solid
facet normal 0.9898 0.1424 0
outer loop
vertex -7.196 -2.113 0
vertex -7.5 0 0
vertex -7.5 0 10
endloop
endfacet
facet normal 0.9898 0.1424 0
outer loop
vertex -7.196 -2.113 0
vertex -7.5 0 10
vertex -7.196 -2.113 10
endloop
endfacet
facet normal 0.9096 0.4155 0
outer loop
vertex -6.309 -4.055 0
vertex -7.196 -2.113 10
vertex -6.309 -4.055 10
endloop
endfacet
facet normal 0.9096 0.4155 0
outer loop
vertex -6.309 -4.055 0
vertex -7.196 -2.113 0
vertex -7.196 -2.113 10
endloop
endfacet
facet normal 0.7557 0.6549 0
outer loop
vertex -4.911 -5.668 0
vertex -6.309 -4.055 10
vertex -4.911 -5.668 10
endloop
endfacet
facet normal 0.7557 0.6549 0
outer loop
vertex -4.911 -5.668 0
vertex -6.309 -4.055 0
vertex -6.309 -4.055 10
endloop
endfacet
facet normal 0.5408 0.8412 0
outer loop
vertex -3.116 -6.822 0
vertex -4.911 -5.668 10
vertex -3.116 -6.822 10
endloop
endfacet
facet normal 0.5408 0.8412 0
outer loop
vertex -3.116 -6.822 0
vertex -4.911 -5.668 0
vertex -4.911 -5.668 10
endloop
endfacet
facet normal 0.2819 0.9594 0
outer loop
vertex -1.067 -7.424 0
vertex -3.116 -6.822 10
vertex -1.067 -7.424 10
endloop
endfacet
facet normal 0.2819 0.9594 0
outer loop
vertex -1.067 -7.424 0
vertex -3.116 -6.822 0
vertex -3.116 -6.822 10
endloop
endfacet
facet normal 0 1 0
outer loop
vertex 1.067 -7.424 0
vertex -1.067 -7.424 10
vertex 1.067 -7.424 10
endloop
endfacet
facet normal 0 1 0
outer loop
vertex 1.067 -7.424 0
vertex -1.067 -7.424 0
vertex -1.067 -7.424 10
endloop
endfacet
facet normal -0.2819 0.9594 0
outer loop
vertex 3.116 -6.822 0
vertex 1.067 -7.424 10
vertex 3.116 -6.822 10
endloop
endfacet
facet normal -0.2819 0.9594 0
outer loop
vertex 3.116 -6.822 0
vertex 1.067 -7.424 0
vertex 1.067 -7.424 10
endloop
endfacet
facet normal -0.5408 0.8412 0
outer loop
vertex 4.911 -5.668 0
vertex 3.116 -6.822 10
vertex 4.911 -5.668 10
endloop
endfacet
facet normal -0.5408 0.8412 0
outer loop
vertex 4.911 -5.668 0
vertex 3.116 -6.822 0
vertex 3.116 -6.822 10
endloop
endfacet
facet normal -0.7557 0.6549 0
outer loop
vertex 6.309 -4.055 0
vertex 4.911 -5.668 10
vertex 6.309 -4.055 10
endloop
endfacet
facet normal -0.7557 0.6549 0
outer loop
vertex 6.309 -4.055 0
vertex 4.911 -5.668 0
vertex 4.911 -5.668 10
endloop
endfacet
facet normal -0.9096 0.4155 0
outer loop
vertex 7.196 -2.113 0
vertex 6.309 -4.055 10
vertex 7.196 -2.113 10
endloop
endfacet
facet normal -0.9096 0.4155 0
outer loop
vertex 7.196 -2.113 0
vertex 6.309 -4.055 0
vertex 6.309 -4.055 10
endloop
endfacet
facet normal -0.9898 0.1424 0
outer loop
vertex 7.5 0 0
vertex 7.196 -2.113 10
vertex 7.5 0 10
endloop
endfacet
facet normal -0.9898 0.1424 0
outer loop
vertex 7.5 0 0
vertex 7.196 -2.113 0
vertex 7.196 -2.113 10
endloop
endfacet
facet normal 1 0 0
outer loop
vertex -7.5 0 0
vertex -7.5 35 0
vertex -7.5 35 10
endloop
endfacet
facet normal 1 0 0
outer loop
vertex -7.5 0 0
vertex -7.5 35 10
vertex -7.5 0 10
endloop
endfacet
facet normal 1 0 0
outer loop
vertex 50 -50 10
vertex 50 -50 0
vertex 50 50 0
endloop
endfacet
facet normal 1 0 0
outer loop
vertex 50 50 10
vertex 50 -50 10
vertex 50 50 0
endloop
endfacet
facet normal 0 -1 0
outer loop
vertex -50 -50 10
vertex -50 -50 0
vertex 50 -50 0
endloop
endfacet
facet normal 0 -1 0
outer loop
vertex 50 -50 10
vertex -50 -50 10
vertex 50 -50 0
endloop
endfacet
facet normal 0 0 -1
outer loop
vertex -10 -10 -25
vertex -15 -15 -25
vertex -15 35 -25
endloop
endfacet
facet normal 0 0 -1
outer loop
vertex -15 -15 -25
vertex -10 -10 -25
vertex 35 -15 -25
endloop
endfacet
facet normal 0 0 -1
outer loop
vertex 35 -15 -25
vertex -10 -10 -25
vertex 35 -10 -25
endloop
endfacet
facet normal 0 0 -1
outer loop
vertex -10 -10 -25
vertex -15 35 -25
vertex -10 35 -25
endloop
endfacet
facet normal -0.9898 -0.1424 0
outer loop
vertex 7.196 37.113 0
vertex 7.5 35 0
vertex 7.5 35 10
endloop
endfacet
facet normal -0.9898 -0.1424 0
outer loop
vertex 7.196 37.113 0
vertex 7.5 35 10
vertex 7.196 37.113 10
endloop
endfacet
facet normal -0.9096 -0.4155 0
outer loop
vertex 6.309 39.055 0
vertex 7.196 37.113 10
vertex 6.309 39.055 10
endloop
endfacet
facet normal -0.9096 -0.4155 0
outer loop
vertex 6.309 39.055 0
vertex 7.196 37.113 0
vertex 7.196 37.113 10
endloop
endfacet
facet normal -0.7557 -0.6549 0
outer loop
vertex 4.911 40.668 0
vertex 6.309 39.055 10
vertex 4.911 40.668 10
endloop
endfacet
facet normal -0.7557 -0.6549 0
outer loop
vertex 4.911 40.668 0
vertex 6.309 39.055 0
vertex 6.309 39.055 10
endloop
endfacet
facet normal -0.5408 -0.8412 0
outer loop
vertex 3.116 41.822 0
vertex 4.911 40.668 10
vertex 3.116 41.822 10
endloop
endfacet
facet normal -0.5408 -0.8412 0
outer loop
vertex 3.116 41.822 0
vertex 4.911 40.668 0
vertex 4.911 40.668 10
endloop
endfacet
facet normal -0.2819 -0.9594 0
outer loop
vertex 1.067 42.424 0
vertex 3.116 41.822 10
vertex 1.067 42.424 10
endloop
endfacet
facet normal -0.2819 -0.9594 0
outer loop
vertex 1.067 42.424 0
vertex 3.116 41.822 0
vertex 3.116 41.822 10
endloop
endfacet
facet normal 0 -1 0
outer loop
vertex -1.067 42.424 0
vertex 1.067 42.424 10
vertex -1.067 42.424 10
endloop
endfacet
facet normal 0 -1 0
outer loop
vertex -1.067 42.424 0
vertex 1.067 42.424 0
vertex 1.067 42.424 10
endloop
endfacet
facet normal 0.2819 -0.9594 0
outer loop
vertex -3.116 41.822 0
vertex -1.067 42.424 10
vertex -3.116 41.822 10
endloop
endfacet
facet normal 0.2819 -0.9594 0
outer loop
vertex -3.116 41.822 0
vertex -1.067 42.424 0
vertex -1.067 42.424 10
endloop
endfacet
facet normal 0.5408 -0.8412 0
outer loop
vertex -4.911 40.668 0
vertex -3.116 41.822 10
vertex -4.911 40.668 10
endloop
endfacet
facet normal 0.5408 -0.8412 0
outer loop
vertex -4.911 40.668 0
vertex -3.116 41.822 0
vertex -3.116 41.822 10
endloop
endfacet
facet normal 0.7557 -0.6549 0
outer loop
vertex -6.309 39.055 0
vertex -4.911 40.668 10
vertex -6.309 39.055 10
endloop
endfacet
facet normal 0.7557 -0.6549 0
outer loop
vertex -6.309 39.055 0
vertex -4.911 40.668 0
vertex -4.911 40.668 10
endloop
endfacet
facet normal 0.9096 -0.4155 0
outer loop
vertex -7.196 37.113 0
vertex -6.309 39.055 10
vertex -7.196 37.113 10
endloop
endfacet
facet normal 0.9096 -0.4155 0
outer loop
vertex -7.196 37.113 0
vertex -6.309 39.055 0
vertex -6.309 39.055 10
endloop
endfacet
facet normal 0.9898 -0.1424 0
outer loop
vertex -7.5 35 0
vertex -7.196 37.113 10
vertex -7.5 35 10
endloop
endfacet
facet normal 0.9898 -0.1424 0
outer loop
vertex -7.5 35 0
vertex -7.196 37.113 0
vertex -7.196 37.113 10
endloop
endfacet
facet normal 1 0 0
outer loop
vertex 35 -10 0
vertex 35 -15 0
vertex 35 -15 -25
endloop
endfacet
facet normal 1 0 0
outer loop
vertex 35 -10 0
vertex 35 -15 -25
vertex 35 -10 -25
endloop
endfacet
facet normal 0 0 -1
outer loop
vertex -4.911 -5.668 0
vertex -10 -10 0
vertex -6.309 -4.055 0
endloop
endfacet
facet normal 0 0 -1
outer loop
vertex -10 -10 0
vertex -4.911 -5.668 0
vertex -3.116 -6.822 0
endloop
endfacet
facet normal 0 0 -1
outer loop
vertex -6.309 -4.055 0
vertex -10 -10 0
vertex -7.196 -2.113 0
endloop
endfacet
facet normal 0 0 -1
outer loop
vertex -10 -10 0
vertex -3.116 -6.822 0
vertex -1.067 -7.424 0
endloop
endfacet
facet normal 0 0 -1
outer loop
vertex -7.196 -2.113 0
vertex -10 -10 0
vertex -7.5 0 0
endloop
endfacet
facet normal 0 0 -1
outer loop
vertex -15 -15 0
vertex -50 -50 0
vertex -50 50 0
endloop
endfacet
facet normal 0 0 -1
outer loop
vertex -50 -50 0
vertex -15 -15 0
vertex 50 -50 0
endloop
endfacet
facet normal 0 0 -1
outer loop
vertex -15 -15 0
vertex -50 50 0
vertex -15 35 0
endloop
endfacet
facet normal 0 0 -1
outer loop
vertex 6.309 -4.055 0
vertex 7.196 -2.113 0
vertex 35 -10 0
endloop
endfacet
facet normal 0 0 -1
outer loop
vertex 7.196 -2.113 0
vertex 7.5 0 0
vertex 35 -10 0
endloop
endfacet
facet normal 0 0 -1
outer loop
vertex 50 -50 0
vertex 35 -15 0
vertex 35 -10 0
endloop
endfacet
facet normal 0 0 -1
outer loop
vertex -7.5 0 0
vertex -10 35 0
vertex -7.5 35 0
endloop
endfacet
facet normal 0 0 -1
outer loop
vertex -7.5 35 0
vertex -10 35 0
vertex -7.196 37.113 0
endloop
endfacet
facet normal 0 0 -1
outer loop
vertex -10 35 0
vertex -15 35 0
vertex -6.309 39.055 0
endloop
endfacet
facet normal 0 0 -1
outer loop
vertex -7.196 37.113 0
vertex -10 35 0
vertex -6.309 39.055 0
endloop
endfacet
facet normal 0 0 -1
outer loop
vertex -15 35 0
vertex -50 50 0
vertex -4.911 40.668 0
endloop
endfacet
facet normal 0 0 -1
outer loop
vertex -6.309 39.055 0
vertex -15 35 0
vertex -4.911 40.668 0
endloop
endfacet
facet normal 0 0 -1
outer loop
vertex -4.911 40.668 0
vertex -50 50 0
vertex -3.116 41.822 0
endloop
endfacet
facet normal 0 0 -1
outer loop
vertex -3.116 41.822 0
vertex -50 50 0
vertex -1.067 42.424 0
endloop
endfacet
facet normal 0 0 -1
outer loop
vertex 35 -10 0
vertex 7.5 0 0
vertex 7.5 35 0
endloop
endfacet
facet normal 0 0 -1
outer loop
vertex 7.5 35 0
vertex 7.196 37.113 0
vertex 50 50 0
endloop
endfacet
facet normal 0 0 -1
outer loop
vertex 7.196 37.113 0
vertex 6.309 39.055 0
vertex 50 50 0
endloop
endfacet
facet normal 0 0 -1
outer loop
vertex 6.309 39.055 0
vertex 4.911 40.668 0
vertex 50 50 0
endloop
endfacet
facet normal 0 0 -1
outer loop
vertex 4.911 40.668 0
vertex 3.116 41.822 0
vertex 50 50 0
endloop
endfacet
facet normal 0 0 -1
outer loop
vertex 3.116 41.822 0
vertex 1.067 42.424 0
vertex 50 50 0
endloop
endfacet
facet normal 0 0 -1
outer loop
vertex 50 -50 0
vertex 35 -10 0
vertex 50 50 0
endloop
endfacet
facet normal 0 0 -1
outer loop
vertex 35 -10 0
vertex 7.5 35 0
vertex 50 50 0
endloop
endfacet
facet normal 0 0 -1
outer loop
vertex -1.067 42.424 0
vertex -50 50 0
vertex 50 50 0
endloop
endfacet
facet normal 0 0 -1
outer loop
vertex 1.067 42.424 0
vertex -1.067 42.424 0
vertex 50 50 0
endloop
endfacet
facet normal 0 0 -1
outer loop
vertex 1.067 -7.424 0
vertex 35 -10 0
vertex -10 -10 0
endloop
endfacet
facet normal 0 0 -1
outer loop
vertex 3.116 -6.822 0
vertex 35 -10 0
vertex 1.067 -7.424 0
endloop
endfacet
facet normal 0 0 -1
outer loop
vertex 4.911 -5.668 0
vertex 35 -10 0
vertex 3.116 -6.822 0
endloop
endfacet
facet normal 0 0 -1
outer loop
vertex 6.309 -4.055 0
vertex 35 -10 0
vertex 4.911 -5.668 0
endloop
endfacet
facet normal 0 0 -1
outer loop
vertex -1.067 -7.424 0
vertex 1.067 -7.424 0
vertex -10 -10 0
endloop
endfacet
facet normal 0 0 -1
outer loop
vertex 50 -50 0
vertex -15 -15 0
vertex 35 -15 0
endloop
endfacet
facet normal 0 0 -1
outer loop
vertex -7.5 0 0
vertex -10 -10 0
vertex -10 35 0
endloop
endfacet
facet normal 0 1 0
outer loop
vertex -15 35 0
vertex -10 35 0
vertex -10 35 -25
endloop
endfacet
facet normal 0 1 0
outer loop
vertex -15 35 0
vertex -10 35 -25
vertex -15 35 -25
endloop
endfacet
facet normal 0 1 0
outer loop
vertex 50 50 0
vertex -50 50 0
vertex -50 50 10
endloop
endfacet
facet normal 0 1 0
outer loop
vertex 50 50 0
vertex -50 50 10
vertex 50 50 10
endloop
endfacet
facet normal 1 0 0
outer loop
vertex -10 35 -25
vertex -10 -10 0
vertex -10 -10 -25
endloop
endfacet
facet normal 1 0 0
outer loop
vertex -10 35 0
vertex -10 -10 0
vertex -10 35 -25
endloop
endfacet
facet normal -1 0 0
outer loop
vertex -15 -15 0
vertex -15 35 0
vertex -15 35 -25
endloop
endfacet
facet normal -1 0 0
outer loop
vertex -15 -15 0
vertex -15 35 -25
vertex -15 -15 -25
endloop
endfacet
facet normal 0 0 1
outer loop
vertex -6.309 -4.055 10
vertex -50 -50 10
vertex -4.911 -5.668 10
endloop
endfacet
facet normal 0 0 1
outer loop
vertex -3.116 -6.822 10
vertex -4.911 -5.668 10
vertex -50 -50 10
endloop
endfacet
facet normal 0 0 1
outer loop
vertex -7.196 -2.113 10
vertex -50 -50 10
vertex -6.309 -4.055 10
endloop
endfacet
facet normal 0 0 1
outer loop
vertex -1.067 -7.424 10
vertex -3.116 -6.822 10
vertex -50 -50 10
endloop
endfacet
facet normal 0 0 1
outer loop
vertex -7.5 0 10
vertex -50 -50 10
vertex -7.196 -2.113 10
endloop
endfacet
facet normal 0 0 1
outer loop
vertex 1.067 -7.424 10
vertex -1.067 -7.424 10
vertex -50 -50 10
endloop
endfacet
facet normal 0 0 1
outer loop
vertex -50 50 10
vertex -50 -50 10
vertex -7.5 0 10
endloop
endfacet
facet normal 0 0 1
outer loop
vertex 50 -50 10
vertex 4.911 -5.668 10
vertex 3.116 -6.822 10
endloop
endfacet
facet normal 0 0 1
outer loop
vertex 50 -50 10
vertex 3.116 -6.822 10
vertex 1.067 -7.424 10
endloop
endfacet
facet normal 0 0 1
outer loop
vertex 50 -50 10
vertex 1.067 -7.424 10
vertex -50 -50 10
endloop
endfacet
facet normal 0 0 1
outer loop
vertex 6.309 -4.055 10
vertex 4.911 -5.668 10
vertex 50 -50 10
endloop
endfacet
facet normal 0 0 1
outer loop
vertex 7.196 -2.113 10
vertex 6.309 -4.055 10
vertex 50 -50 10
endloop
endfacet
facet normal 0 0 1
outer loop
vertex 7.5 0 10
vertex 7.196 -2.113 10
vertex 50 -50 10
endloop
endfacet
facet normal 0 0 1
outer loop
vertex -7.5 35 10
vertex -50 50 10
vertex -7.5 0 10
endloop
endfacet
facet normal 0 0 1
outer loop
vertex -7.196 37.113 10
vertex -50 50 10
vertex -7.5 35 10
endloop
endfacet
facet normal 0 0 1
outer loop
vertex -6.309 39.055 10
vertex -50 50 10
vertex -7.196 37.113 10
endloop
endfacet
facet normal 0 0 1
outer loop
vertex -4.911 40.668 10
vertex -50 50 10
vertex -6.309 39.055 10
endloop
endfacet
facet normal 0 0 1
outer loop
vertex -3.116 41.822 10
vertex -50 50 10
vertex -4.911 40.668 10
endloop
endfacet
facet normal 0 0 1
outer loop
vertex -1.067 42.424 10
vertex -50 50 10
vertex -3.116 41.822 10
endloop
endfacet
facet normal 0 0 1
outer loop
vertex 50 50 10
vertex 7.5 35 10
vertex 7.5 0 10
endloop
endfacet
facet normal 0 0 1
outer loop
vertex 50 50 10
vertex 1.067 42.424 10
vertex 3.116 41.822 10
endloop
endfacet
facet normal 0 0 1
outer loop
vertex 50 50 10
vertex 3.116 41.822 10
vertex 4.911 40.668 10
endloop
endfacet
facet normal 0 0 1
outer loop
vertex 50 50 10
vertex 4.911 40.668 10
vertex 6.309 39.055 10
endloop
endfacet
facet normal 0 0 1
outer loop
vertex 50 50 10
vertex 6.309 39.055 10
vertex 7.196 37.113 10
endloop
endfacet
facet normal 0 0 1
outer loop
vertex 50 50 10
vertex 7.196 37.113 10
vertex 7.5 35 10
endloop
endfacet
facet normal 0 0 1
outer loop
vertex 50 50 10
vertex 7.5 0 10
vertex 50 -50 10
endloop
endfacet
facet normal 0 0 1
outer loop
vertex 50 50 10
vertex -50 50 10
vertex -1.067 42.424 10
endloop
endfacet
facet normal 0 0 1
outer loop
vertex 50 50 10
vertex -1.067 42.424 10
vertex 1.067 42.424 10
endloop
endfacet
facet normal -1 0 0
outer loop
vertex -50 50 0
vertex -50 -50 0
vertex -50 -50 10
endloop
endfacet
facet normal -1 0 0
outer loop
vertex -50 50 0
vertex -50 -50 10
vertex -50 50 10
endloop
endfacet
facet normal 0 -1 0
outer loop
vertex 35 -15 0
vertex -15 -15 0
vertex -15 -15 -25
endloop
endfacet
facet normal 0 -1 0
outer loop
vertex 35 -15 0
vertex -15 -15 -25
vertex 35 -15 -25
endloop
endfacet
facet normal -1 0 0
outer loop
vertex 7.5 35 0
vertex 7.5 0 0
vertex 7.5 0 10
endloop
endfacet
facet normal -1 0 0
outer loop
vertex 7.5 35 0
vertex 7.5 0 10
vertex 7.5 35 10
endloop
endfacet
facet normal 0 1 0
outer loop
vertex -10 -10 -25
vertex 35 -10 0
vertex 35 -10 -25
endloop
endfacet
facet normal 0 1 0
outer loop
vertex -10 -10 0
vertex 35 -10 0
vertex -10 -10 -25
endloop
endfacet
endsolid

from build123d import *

# Parameters (mm, degrees)
F0_W     = 100
F0_H     = 100
F1_DEPTH = 10
F3_DEPTH = 25
F5_DEPTH = 25


with BuildPart() as f1:
    # F0 (on Top) → F1 (new body)
    with BuildSketch(Plane.XY):
        Rectangle(F0_W, F0_H)
    extrude(amount=F1_DEPTH)

    # F2 (on Top) → F3 (join)
    with BuildSketch(Plane.XY):
        Polygon((34.999999, -10), (-10, -10), (-10, 34.999999), (-15.000001, 34.999999), (-15.000001, -15.000001), (34.999999, -15.000001), align=None)
    extrude(amount=-F3_DEPTH)

    # F4 (on Top) → F5 (cut)
    with BuildSketch(Plane.XY):
        with BuildLine():
            ThreePointArc((-7.5, 0), (0, -7.5), (7.5, 0))
            ThreePointArc((7.5, 0), (0, 7.5), (-7.5, 0))
        make_face()
        with BuildLine():
            ThreePointArc((-7.5, 0), (0, 7.5), (7.5, 0))
            Line((7.5, 0), (7.5, 35))
            ThreePointArc((7.5, 35), (0, 27.5), (-7.5, 35))
            Line((-7.5, 35), (-7.5, 0))
        make_face()
        with BuildLine():
            ThreePointArc((-7.5, 35), (0, 27.5), (7.5, 35))
            ThreePointArc((7.5, 35), (0, 42.5), (-7.5, 35))
        make_face()
    extrude(amount=F5_DEPTH, mode=Mode.SUBTRACT)


solid = f1.part
